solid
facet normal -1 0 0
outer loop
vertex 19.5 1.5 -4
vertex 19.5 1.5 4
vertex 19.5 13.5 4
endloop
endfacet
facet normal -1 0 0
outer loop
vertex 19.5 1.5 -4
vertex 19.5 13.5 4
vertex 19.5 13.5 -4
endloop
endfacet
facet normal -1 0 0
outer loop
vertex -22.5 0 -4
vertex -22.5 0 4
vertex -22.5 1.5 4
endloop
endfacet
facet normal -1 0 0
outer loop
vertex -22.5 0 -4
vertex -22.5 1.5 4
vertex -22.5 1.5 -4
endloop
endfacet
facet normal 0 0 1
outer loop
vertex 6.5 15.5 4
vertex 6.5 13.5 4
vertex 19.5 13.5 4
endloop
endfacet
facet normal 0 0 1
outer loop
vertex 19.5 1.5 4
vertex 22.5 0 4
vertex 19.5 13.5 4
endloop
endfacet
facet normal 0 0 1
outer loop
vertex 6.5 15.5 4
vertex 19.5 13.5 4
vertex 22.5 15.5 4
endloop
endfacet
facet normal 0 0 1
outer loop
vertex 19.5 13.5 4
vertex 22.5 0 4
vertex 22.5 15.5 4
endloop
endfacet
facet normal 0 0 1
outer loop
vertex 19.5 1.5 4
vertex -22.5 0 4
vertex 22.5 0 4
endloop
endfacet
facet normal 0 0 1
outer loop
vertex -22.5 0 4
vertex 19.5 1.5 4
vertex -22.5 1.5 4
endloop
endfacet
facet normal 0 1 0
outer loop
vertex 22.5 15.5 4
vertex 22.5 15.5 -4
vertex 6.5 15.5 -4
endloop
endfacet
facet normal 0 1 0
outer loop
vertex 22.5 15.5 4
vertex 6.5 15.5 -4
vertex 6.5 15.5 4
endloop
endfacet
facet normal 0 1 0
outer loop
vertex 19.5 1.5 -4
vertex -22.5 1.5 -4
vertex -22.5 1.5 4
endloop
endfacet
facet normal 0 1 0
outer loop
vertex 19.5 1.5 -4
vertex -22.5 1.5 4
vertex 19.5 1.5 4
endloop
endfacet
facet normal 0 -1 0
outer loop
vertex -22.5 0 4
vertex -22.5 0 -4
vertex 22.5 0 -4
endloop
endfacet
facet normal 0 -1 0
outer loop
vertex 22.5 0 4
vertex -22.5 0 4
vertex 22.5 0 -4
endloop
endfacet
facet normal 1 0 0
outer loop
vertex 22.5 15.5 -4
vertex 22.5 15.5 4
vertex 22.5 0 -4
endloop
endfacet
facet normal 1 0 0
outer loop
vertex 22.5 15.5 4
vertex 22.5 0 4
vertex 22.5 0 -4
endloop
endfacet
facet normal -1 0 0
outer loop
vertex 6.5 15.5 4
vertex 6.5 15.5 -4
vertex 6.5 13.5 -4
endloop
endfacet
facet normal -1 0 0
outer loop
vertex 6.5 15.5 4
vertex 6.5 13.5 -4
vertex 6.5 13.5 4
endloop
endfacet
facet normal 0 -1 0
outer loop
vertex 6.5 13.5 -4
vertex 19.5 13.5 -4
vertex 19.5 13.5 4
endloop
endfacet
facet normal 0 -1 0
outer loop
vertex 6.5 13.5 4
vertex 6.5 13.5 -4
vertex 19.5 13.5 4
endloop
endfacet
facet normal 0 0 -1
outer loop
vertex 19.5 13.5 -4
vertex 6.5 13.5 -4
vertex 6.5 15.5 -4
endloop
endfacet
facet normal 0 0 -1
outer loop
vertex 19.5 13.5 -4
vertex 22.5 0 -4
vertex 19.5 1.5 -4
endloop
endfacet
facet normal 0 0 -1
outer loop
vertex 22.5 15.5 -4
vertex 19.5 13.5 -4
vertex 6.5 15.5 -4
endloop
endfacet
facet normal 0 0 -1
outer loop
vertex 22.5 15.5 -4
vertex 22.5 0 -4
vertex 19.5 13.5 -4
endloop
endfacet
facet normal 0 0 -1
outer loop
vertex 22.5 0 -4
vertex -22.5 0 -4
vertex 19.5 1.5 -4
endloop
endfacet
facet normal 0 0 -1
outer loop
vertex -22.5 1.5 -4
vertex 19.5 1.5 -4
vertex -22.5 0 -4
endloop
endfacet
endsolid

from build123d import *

# Parameters (mm, degrees)
SKETCH1_W           = 45
SKETCH1_H           = 8
BOSS_EXTRUDE1_DEPTH = 1.5
SKETCH2_W           = 3
SKETCH2_H           = 8
BOSS_EXTRUDE2_DEPTH = 14
SKETCH3_W           = 8
SKETCH3_H           = 2
BOSS_EXTRUDE3_DEPTH = 13


with BuildPart() as part:
    # Sketch1 → Boss-Extrude1 (new body)
    with BuildSketch(Plane(origin=(0, 0, 0), x_dir=(1, 0, 0), z_dir=(0, 1, 0))):
        Rectangle(SKETCH1_W, SKETCH1_H)
    extrude(amount=BOSS_EXTRUDE1_DEPTH)

    # Sketch2 → Boss-Extrude2 (add)
    with BuildSketch(Plane(origin=(0, 1.5, 0), x_dir=(1, 0, 0), z_dir=(0, 1, 0))):
        with Locations((21, 0)):
            Rectangle(SKETCH2_W, SKETCH2_H)
    extrude(amount=BOSS_EXTRUDE2_DEPTH)

    # Sketch3 → Boss-Extrude3 (add)
    with BuildSketch(Plane.ZY.offset(-19.5)):
        with Locations((0, 14.5)):
            Rectangle(SKETCH3_W, SKETCH3_H)
    extrude(amount=BOSS_EXTRUDE3_DEPTH)


solid = part.part
